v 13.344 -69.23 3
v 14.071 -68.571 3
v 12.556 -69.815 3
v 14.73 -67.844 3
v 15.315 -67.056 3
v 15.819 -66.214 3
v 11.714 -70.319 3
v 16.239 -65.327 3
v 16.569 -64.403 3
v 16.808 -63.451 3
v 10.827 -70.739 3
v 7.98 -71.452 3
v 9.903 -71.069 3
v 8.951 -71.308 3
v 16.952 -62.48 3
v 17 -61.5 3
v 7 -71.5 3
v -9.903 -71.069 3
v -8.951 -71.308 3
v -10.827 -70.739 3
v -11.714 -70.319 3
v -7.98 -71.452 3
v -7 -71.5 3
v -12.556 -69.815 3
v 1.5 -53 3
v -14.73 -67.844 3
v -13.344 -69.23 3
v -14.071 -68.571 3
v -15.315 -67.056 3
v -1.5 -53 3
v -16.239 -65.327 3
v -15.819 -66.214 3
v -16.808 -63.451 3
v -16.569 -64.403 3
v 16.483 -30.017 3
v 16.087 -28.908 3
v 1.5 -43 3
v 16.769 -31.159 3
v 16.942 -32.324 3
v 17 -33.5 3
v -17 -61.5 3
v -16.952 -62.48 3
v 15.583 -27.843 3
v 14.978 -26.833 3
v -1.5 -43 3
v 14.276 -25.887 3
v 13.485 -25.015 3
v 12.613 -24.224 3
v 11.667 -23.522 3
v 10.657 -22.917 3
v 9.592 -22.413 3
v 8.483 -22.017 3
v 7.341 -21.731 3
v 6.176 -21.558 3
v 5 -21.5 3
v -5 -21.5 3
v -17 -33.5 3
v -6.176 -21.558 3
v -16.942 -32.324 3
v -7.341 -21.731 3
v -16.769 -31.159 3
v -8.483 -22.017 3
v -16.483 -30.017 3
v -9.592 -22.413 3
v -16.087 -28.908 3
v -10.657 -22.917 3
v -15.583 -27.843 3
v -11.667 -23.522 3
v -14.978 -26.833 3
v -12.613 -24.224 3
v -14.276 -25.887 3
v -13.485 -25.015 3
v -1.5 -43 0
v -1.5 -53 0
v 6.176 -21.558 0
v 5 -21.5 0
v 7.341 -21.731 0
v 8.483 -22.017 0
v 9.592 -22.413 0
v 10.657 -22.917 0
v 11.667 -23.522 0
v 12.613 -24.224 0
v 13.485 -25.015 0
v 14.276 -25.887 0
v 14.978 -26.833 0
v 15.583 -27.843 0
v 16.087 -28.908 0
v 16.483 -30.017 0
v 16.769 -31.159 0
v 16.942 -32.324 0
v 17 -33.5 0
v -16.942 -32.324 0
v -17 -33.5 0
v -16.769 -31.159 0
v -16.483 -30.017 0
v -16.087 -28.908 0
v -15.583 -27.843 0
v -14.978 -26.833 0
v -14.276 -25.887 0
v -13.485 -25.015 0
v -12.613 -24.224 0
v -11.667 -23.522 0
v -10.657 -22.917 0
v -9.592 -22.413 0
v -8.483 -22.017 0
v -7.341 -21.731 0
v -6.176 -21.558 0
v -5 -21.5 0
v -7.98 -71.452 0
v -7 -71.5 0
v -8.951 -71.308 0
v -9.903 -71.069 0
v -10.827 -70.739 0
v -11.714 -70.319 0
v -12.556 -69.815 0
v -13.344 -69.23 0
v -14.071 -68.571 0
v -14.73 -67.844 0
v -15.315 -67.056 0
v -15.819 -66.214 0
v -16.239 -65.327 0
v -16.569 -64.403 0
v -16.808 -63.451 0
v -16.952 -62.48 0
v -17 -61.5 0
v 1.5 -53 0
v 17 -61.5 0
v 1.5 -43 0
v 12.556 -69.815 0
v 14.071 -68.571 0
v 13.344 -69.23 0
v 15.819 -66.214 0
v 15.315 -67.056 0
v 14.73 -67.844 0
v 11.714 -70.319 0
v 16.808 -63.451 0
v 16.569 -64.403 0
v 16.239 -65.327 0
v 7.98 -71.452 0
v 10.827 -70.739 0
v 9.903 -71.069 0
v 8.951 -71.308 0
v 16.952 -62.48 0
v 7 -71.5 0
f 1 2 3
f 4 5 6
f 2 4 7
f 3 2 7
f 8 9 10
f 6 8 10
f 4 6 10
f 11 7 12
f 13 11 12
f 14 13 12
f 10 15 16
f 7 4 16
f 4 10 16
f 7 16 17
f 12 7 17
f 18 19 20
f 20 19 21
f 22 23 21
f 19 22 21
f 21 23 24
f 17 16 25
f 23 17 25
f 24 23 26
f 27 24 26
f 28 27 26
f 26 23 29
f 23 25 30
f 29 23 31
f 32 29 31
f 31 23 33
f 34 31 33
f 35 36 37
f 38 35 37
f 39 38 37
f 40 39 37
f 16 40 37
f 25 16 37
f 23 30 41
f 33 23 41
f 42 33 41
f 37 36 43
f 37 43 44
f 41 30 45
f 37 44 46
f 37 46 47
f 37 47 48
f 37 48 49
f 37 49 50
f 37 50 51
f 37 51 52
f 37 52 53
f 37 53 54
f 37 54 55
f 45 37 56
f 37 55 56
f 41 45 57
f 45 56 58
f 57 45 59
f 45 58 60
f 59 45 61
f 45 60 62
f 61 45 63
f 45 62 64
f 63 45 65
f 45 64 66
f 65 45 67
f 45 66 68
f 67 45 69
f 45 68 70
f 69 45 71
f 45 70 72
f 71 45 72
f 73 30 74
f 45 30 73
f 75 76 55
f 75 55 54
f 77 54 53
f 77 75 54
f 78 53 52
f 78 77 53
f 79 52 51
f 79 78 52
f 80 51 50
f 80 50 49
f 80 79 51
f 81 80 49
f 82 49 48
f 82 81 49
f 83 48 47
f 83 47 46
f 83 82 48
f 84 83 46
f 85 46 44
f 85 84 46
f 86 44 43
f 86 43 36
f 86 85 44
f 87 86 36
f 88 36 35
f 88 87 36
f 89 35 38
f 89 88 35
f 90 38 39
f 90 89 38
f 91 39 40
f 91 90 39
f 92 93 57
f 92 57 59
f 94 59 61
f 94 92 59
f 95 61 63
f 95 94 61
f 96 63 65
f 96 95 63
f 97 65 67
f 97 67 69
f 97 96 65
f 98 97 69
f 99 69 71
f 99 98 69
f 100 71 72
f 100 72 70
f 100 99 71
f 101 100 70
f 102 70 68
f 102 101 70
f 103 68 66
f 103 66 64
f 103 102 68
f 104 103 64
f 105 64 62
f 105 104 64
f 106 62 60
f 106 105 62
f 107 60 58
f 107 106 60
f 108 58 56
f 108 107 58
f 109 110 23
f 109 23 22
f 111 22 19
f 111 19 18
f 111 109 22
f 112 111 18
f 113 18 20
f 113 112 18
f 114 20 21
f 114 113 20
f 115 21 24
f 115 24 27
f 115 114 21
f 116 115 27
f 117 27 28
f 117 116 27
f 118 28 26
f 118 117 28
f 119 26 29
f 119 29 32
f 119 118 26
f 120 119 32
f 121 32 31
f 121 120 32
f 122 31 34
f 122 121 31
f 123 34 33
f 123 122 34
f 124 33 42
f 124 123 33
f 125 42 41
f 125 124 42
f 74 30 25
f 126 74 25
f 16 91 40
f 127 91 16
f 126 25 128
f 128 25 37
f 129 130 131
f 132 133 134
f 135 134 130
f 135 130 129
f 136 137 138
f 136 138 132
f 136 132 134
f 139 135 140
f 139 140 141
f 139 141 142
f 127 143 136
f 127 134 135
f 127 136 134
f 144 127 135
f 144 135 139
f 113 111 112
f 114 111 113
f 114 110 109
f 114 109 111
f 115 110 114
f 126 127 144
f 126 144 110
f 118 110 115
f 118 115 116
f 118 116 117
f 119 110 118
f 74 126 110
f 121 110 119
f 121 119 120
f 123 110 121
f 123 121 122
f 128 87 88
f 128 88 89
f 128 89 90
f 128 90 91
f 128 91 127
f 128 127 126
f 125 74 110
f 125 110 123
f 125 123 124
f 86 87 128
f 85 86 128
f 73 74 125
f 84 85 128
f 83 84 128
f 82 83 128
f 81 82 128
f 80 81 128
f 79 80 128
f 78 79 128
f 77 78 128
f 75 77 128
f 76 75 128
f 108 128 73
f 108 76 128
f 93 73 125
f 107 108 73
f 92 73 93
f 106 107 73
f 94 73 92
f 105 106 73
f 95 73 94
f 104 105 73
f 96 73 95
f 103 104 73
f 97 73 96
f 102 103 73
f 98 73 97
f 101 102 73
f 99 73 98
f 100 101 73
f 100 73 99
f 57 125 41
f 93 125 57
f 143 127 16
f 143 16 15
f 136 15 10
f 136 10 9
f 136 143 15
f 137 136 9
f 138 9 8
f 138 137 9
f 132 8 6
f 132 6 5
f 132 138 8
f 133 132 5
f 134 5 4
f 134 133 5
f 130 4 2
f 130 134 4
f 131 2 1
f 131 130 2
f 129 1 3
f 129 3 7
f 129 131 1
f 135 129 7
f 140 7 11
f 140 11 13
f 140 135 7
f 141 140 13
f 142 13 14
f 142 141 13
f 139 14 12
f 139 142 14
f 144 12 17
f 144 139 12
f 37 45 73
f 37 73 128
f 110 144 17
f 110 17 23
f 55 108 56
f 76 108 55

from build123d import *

# Parameters (mm, degrees)
BOSS_EXTRUDE1_DEPTH = 3
SKETCH2_W           = 3
SKETCH2_H           = 10
CUT_EXTRUDE1_DEPTH  = 10


with BuildPart() as part:
    # Sketch1 → Boss-Extrude1 (new body)
    with BuildSketch(Plane.XY):
        with BuildLine():
            Line((-5, -21.5), (5, -21.5))
            ThreePointArc((5, -21.5), (13.485281374, -25.014718626), (17, -33.5))
            Line((17, -33.5), (17, -61.5))
            ThreePointArc((17, -61.5), (14.071067812, -68.571067812), (7, -71.5))
            Line((7, -71.5), (0.5, -71.5))
            Line((0.5, -71.5), (-0.5, -71.5))
            Line((-0.5, -71.5), (-7, -71.5))
            ThreePointArc((-7, -71.5), (-14.071067812, -68.571067812), (-17, -61.5))
            Line((-17, -61.5), (-17, -33.5))
            ThreePointArc((-17, -33.5), (-13.485281374, -25.014718626), (-5, -21.5))
        make_face()
    extrude(amount=BOSS_EXTRUDE1_DEPTH)

    # Sketch2 → Cut-Extrude1 (cut)
    with BuildSketch(Plane.XY.offset(3)):
        with Locations((0, -48)):
            Rectangle(SKETCH2_W, SKETCH2_H)
    extrude(amount=-CUT_EXTRUDE1_DEPTH, mode=Mode.SUBTRACT)


solid = part.part
